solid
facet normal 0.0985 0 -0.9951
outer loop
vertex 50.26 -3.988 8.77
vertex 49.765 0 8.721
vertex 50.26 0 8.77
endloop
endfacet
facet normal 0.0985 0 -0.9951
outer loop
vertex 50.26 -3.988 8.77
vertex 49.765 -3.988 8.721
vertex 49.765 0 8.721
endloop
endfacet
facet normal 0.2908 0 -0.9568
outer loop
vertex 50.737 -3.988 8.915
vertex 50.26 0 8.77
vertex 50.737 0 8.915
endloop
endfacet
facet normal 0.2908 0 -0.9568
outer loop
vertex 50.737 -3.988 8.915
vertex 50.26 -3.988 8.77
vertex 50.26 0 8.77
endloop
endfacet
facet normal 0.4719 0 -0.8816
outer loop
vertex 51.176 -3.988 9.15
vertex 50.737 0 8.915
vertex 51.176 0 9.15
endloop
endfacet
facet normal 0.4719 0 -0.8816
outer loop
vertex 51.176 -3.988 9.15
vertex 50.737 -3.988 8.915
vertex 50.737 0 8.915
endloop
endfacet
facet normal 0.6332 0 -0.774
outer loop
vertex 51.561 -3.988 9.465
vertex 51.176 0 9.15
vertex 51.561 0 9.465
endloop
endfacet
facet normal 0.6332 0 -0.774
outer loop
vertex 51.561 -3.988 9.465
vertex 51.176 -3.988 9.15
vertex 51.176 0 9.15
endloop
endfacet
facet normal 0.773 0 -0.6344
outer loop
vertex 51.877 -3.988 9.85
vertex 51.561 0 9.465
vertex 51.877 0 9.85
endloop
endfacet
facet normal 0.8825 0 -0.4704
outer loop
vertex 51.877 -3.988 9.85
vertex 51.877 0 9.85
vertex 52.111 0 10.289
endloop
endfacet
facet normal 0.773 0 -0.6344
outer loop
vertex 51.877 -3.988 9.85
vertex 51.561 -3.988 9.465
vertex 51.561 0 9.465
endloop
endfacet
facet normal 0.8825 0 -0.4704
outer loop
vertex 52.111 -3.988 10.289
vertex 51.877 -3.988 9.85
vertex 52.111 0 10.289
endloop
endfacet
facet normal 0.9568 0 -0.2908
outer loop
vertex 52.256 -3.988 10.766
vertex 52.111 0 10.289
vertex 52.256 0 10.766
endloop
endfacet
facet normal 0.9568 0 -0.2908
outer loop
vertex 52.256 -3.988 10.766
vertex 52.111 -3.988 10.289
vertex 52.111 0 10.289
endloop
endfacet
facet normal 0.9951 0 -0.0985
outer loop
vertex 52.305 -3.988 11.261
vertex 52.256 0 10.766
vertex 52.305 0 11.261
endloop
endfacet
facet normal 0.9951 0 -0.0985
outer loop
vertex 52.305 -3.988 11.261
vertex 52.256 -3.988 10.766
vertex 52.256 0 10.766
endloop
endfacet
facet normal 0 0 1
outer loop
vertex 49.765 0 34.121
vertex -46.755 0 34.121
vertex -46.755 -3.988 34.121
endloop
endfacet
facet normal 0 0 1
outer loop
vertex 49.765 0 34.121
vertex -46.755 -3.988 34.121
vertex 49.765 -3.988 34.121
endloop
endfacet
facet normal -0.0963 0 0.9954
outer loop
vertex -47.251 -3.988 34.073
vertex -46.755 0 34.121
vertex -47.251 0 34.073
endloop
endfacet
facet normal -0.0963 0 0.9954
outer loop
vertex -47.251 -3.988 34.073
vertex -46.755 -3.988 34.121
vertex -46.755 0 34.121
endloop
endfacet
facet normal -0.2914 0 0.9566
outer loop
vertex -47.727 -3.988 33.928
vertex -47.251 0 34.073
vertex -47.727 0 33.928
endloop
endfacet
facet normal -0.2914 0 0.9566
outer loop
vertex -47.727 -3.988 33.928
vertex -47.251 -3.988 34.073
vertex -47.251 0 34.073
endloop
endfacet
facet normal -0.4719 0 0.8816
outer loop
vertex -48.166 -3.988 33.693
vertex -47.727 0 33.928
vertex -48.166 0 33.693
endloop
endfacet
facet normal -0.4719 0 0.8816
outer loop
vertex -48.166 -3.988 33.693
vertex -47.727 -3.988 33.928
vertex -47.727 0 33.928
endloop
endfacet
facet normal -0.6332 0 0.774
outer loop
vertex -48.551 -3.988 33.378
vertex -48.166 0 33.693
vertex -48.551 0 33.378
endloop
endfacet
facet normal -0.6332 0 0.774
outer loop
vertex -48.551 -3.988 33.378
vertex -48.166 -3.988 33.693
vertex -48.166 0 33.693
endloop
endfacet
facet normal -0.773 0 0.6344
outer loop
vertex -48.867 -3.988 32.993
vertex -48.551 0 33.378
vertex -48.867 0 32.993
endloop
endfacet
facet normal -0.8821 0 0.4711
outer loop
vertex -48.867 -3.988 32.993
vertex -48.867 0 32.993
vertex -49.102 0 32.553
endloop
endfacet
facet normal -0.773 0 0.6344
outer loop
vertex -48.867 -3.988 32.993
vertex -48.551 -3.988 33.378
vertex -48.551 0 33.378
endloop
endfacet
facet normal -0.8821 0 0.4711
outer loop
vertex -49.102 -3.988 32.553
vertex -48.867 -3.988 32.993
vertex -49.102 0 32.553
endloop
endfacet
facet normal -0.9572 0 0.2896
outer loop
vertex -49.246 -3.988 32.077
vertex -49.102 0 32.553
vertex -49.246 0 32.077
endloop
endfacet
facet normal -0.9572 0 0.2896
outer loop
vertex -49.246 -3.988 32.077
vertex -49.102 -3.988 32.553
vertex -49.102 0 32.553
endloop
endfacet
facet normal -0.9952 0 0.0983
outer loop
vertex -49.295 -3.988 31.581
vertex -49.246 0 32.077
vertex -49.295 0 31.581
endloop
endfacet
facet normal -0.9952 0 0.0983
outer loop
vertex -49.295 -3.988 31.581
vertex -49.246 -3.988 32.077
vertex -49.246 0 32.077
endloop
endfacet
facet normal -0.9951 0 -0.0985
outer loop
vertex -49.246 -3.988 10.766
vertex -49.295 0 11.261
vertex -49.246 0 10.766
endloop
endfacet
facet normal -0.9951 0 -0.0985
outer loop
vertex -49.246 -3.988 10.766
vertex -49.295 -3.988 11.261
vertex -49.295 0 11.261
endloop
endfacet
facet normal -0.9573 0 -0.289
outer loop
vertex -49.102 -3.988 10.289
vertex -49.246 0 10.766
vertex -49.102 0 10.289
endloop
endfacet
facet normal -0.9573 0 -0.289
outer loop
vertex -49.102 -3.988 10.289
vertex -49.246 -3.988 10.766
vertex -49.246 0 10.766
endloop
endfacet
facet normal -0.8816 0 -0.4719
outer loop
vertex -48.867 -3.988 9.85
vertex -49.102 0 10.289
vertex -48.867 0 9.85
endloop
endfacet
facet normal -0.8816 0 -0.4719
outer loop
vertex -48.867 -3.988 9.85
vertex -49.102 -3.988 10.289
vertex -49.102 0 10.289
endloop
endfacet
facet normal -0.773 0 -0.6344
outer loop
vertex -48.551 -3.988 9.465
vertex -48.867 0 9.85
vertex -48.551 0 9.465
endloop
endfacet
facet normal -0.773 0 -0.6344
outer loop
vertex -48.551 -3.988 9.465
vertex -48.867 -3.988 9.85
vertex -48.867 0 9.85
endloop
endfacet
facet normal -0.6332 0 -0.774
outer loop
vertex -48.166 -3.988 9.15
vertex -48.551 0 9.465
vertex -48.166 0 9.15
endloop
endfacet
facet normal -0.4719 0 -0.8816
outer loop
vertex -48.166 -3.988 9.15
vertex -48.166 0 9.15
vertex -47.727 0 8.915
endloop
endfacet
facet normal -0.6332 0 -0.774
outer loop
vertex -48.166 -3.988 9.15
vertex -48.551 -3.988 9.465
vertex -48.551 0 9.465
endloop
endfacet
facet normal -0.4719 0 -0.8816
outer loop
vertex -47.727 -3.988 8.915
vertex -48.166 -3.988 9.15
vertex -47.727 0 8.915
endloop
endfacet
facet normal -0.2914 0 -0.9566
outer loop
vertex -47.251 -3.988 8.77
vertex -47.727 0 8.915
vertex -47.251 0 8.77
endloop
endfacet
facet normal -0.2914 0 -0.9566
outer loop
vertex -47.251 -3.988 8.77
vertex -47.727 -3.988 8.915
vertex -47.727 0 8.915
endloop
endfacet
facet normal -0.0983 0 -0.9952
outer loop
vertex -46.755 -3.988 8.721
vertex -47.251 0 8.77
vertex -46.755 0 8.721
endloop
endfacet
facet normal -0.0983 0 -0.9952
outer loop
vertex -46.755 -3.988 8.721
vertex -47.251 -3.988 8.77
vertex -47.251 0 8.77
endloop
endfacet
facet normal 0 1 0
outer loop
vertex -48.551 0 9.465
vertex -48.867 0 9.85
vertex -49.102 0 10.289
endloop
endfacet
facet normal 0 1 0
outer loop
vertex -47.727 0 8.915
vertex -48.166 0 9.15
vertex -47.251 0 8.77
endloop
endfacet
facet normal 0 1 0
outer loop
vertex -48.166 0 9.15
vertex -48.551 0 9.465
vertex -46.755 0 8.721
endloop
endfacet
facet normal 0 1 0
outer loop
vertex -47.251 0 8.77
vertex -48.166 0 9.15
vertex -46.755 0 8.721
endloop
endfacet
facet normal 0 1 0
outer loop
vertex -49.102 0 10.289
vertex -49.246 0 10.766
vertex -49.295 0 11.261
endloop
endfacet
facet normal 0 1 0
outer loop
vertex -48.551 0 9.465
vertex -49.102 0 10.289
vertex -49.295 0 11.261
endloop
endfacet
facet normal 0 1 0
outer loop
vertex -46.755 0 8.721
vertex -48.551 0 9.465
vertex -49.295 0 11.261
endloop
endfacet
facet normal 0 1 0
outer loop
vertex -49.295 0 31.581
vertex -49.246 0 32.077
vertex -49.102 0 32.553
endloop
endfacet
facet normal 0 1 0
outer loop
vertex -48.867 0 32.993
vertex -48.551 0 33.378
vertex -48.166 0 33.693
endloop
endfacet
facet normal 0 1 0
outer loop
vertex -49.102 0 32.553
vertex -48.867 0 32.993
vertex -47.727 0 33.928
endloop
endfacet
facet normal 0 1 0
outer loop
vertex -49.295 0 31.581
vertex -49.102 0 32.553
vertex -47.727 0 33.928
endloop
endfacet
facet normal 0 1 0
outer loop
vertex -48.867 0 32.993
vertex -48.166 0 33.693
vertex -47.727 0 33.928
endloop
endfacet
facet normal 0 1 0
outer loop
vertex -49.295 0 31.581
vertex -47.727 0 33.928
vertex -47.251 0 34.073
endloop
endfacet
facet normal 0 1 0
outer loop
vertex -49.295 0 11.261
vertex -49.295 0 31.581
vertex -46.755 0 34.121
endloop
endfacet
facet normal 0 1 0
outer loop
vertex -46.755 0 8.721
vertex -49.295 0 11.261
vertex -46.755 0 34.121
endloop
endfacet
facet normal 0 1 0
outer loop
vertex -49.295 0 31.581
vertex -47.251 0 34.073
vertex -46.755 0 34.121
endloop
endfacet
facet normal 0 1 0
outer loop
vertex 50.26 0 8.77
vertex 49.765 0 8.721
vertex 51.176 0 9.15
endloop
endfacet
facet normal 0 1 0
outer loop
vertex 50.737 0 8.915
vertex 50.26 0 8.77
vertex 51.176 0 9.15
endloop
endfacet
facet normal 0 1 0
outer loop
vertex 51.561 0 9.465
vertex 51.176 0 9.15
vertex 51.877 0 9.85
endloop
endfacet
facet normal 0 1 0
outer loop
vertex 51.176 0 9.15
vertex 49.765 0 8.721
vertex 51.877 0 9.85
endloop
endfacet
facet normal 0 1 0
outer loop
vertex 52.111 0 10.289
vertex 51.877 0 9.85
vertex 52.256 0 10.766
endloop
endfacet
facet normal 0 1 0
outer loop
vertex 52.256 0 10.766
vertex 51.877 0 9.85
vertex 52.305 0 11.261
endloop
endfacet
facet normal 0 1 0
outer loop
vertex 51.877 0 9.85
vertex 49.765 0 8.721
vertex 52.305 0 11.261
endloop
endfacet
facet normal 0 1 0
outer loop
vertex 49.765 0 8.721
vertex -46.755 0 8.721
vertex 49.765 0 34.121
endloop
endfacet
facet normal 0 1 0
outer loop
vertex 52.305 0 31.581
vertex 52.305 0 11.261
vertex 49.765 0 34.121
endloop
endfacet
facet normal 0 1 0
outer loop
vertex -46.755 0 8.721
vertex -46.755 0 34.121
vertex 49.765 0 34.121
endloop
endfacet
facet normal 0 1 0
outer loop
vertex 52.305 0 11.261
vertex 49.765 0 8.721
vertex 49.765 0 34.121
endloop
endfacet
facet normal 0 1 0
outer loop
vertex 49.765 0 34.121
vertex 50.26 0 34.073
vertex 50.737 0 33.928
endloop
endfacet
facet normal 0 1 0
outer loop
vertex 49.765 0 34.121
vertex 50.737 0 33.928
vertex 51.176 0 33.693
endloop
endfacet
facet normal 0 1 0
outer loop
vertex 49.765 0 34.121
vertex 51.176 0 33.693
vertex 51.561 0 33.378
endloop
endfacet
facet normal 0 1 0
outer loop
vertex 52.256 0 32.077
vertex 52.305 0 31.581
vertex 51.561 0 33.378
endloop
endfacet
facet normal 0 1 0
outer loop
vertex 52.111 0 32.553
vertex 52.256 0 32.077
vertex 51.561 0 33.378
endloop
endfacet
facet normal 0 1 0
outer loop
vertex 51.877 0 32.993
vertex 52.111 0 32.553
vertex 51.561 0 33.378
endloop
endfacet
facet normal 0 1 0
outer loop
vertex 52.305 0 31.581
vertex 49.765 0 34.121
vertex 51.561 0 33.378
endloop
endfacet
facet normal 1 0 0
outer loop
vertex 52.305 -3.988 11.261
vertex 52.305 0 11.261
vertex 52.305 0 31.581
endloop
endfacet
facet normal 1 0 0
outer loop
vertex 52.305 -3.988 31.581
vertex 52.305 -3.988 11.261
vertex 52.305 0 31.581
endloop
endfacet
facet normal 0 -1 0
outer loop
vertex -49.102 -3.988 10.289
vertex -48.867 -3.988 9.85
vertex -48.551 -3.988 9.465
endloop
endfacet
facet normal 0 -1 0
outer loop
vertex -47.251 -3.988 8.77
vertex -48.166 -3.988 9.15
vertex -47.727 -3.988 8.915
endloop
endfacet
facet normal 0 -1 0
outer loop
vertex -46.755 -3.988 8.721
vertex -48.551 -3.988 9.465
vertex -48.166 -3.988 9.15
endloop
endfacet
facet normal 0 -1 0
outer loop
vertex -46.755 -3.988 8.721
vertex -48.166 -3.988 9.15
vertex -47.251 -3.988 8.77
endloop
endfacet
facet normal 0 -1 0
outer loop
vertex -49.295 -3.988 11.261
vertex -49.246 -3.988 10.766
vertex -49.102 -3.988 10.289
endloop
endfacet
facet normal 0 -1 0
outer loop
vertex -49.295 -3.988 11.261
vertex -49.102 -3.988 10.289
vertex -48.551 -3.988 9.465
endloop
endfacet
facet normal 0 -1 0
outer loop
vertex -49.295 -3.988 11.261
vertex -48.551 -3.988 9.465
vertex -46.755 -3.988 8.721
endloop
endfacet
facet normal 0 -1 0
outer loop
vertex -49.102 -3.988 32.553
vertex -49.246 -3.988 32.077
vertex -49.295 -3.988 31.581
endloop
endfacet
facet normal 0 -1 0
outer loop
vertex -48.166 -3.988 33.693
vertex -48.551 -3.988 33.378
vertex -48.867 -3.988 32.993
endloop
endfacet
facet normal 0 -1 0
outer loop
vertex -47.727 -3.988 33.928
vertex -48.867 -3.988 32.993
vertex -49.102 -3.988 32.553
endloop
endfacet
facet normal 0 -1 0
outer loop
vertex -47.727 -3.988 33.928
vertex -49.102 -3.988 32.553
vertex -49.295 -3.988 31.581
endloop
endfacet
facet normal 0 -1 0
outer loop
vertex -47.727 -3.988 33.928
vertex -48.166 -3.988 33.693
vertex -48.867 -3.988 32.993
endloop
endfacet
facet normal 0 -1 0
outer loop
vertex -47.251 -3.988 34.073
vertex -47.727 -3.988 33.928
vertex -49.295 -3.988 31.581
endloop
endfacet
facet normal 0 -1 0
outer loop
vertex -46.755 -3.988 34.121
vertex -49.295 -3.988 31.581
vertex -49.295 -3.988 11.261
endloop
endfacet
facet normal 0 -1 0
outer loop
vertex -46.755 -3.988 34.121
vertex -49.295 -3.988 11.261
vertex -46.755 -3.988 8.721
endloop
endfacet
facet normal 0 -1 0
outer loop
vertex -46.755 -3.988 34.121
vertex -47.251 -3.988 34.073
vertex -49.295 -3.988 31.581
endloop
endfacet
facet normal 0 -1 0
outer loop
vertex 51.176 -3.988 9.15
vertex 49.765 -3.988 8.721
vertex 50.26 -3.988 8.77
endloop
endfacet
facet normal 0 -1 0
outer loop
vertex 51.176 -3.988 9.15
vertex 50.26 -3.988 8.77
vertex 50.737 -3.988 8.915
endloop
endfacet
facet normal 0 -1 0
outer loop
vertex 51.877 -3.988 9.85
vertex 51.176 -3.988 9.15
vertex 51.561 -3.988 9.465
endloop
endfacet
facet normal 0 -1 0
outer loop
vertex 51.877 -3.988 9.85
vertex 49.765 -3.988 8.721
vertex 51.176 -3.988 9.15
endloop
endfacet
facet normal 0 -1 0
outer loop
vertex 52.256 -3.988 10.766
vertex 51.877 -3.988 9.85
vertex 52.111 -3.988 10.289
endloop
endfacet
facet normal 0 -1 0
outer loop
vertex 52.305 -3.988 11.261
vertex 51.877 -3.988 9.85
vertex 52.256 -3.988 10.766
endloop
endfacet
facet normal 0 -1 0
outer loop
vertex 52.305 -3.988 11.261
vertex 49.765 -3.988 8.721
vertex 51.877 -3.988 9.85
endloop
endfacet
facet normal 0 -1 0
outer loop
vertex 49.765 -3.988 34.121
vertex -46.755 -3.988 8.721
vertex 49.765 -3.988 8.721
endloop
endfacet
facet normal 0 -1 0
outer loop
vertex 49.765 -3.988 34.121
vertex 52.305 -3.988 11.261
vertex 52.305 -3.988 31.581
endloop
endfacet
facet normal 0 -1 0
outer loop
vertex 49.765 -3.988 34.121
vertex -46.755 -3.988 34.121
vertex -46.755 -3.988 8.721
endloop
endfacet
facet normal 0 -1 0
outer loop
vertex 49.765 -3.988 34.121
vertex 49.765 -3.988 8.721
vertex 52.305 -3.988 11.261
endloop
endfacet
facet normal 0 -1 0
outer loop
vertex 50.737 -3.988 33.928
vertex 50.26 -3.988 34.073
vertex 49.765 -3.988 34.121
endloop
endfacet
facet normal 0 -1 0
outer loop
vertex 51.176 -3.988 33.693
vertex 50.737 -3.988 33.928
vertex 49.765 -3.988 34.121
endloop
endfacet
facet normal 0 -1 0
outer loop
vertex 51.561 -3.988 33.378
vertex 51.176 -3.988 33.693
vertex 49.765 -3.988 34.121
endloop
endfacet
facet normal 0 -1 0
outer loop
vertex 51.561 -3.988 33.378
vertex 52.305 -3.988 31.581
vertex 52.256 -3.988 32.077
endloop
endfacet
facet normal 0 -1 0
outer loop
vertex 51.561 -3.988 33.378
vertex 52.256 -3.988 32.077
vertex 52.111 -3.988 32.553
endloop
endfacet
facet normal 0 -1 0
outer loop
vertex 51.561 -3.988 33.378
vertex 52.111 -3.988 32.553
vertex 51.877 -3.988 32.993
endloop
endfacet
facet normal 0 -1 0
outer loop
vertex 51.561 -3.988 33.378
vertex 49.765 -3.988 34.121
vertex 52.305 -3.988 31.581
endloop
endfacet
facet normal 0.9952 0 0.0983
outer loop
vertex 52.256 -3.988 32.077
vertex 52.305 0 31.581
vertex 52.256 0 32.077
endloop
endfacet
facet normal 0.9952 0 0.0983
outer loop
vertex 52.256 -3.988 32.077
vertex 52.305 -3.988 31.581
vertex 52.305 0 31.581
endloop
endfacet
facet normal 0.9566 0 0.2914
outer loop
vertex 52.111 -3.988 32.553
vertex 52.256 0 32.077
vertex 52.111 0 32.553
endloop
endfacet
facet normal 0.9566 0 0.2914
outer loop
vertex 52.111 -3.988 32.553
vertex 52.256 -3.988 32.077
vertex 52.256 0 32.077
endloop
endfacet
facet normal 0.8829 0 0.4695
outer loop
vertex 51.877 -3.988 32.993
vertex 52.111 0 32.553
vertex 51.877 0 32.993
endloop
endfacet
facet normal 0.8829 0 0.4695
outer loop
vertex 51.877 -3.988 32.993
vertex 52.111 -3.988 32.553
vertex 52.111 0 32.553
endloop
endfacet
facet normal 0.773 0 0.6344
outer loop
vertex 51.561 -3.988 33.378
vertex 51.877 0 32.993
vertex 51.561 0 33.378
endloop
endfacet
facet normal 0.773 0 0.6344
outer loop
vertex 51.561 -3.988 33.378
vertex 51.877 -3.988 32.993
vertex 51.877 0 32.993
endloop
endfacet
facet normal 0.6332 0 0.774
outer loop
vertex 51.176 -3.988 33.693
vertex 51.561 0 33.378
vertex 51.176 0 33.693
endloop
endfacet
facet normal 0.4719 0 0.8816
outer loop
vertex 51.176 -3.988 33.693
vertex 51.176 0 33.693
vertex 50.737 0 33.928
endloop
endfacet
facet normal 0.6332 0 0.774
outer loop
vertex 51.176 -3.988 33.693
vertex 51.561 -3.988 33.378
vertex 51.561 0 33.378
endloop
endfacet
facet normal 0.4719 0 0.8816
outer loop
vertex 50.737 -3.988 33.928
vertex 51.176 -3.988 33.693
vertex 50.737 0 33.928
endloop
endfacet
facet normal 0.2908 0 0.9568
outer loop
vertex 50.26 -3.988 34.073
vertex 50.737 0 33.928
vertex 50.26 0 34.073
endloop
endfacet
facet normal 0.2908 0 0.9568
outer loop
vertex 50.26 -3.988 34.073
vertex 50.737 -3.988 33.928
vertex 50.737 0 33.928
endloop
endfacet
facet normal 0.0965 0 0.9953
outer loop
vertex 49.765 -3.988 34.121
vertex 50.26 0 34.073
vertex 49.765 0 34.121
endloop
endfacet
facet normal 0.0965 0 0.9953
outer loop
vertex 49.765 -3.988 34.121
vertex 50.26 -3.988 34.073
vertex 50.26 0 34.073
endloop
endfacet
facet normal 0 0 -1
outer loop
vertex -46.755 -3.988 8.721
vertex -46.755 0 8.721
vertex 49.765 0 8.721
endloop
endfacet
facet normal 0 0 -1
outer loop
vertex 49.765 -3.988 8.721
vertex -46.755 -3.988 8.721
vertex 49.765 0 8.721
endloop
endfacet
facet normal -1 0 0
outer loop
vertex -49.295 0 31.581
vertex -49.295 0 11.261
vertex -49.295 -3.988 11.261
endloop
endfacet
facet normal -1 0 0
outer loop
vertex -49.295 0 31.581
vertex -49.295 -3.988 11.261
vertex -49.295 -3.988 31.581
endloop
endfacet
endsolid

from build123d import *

# Parameters (mm, degrees)
F0_W          = 101.6
F0_H          = 25.4
F1_DEPTH      = 3.9878
F2_R          = 2.54
F3_R          = 2.54
F4_R          = 2.54
F5_R          = 2.54
F6_R          = 1.5875
F7_DEPTH      = 8.721469
F7_DEPTH_BACK = 3.175


with BuildPart() as f1:
    # F0 (on Front) → F1 (new body)
    with BuildSketch(Plane.XZ):
        with Locations((1.504738, 21.421469)):
            Rectangle(F0_W, F0_H)
    extrude(amount=F1_DEPTH)

    # F2
    f2_edges = [f1.edges().sort_by_distance(p)[0] for p in [
        (-49.295262, -1.9939, 8.721469),
    ]]
    fillet(f2_edges, radius=F2_R)

    # F3
    f3_edges = [f1.edges().sort_by_distance(p)[0] for p in [
        (52.304738, -1.9939, 8.721469),
    ]]
    fillet(f3_edges, radius=F3_R)

    # F4
    f4_edges = [f1.edges().sort_by_distance(p)[0] for p in [
        (52.304738, -1.9939, 34.121469),
    ]]
    fillet(f4_edges, radius=F4_R)

    # F5
    f5_edges = [f1.edges().sort_by_distance(p)[0] for p in [
        (-49.295262, -1.9939, 34.121469),
    ]]
    fillet(f5_edges, radius=F5_R)

    # F6 (on Top) → F7 (cut, two sides)
    with BuildSketch(Plane.XY) as f7_sk:
        with Locations((-44.215262, -1.9939)):
            Circle(F6_R)
        with Locations((47.224738, -1.9939)):
            Circle(F6_R)
    extrude(amount=F7_DEPTH, mode=Mode.SUBTRACT)
    extrude(f7_sk.sketch, amount=-F7_DEPTH_BACK, mode=Mode.SUBTRACT)


solid = f1.part
